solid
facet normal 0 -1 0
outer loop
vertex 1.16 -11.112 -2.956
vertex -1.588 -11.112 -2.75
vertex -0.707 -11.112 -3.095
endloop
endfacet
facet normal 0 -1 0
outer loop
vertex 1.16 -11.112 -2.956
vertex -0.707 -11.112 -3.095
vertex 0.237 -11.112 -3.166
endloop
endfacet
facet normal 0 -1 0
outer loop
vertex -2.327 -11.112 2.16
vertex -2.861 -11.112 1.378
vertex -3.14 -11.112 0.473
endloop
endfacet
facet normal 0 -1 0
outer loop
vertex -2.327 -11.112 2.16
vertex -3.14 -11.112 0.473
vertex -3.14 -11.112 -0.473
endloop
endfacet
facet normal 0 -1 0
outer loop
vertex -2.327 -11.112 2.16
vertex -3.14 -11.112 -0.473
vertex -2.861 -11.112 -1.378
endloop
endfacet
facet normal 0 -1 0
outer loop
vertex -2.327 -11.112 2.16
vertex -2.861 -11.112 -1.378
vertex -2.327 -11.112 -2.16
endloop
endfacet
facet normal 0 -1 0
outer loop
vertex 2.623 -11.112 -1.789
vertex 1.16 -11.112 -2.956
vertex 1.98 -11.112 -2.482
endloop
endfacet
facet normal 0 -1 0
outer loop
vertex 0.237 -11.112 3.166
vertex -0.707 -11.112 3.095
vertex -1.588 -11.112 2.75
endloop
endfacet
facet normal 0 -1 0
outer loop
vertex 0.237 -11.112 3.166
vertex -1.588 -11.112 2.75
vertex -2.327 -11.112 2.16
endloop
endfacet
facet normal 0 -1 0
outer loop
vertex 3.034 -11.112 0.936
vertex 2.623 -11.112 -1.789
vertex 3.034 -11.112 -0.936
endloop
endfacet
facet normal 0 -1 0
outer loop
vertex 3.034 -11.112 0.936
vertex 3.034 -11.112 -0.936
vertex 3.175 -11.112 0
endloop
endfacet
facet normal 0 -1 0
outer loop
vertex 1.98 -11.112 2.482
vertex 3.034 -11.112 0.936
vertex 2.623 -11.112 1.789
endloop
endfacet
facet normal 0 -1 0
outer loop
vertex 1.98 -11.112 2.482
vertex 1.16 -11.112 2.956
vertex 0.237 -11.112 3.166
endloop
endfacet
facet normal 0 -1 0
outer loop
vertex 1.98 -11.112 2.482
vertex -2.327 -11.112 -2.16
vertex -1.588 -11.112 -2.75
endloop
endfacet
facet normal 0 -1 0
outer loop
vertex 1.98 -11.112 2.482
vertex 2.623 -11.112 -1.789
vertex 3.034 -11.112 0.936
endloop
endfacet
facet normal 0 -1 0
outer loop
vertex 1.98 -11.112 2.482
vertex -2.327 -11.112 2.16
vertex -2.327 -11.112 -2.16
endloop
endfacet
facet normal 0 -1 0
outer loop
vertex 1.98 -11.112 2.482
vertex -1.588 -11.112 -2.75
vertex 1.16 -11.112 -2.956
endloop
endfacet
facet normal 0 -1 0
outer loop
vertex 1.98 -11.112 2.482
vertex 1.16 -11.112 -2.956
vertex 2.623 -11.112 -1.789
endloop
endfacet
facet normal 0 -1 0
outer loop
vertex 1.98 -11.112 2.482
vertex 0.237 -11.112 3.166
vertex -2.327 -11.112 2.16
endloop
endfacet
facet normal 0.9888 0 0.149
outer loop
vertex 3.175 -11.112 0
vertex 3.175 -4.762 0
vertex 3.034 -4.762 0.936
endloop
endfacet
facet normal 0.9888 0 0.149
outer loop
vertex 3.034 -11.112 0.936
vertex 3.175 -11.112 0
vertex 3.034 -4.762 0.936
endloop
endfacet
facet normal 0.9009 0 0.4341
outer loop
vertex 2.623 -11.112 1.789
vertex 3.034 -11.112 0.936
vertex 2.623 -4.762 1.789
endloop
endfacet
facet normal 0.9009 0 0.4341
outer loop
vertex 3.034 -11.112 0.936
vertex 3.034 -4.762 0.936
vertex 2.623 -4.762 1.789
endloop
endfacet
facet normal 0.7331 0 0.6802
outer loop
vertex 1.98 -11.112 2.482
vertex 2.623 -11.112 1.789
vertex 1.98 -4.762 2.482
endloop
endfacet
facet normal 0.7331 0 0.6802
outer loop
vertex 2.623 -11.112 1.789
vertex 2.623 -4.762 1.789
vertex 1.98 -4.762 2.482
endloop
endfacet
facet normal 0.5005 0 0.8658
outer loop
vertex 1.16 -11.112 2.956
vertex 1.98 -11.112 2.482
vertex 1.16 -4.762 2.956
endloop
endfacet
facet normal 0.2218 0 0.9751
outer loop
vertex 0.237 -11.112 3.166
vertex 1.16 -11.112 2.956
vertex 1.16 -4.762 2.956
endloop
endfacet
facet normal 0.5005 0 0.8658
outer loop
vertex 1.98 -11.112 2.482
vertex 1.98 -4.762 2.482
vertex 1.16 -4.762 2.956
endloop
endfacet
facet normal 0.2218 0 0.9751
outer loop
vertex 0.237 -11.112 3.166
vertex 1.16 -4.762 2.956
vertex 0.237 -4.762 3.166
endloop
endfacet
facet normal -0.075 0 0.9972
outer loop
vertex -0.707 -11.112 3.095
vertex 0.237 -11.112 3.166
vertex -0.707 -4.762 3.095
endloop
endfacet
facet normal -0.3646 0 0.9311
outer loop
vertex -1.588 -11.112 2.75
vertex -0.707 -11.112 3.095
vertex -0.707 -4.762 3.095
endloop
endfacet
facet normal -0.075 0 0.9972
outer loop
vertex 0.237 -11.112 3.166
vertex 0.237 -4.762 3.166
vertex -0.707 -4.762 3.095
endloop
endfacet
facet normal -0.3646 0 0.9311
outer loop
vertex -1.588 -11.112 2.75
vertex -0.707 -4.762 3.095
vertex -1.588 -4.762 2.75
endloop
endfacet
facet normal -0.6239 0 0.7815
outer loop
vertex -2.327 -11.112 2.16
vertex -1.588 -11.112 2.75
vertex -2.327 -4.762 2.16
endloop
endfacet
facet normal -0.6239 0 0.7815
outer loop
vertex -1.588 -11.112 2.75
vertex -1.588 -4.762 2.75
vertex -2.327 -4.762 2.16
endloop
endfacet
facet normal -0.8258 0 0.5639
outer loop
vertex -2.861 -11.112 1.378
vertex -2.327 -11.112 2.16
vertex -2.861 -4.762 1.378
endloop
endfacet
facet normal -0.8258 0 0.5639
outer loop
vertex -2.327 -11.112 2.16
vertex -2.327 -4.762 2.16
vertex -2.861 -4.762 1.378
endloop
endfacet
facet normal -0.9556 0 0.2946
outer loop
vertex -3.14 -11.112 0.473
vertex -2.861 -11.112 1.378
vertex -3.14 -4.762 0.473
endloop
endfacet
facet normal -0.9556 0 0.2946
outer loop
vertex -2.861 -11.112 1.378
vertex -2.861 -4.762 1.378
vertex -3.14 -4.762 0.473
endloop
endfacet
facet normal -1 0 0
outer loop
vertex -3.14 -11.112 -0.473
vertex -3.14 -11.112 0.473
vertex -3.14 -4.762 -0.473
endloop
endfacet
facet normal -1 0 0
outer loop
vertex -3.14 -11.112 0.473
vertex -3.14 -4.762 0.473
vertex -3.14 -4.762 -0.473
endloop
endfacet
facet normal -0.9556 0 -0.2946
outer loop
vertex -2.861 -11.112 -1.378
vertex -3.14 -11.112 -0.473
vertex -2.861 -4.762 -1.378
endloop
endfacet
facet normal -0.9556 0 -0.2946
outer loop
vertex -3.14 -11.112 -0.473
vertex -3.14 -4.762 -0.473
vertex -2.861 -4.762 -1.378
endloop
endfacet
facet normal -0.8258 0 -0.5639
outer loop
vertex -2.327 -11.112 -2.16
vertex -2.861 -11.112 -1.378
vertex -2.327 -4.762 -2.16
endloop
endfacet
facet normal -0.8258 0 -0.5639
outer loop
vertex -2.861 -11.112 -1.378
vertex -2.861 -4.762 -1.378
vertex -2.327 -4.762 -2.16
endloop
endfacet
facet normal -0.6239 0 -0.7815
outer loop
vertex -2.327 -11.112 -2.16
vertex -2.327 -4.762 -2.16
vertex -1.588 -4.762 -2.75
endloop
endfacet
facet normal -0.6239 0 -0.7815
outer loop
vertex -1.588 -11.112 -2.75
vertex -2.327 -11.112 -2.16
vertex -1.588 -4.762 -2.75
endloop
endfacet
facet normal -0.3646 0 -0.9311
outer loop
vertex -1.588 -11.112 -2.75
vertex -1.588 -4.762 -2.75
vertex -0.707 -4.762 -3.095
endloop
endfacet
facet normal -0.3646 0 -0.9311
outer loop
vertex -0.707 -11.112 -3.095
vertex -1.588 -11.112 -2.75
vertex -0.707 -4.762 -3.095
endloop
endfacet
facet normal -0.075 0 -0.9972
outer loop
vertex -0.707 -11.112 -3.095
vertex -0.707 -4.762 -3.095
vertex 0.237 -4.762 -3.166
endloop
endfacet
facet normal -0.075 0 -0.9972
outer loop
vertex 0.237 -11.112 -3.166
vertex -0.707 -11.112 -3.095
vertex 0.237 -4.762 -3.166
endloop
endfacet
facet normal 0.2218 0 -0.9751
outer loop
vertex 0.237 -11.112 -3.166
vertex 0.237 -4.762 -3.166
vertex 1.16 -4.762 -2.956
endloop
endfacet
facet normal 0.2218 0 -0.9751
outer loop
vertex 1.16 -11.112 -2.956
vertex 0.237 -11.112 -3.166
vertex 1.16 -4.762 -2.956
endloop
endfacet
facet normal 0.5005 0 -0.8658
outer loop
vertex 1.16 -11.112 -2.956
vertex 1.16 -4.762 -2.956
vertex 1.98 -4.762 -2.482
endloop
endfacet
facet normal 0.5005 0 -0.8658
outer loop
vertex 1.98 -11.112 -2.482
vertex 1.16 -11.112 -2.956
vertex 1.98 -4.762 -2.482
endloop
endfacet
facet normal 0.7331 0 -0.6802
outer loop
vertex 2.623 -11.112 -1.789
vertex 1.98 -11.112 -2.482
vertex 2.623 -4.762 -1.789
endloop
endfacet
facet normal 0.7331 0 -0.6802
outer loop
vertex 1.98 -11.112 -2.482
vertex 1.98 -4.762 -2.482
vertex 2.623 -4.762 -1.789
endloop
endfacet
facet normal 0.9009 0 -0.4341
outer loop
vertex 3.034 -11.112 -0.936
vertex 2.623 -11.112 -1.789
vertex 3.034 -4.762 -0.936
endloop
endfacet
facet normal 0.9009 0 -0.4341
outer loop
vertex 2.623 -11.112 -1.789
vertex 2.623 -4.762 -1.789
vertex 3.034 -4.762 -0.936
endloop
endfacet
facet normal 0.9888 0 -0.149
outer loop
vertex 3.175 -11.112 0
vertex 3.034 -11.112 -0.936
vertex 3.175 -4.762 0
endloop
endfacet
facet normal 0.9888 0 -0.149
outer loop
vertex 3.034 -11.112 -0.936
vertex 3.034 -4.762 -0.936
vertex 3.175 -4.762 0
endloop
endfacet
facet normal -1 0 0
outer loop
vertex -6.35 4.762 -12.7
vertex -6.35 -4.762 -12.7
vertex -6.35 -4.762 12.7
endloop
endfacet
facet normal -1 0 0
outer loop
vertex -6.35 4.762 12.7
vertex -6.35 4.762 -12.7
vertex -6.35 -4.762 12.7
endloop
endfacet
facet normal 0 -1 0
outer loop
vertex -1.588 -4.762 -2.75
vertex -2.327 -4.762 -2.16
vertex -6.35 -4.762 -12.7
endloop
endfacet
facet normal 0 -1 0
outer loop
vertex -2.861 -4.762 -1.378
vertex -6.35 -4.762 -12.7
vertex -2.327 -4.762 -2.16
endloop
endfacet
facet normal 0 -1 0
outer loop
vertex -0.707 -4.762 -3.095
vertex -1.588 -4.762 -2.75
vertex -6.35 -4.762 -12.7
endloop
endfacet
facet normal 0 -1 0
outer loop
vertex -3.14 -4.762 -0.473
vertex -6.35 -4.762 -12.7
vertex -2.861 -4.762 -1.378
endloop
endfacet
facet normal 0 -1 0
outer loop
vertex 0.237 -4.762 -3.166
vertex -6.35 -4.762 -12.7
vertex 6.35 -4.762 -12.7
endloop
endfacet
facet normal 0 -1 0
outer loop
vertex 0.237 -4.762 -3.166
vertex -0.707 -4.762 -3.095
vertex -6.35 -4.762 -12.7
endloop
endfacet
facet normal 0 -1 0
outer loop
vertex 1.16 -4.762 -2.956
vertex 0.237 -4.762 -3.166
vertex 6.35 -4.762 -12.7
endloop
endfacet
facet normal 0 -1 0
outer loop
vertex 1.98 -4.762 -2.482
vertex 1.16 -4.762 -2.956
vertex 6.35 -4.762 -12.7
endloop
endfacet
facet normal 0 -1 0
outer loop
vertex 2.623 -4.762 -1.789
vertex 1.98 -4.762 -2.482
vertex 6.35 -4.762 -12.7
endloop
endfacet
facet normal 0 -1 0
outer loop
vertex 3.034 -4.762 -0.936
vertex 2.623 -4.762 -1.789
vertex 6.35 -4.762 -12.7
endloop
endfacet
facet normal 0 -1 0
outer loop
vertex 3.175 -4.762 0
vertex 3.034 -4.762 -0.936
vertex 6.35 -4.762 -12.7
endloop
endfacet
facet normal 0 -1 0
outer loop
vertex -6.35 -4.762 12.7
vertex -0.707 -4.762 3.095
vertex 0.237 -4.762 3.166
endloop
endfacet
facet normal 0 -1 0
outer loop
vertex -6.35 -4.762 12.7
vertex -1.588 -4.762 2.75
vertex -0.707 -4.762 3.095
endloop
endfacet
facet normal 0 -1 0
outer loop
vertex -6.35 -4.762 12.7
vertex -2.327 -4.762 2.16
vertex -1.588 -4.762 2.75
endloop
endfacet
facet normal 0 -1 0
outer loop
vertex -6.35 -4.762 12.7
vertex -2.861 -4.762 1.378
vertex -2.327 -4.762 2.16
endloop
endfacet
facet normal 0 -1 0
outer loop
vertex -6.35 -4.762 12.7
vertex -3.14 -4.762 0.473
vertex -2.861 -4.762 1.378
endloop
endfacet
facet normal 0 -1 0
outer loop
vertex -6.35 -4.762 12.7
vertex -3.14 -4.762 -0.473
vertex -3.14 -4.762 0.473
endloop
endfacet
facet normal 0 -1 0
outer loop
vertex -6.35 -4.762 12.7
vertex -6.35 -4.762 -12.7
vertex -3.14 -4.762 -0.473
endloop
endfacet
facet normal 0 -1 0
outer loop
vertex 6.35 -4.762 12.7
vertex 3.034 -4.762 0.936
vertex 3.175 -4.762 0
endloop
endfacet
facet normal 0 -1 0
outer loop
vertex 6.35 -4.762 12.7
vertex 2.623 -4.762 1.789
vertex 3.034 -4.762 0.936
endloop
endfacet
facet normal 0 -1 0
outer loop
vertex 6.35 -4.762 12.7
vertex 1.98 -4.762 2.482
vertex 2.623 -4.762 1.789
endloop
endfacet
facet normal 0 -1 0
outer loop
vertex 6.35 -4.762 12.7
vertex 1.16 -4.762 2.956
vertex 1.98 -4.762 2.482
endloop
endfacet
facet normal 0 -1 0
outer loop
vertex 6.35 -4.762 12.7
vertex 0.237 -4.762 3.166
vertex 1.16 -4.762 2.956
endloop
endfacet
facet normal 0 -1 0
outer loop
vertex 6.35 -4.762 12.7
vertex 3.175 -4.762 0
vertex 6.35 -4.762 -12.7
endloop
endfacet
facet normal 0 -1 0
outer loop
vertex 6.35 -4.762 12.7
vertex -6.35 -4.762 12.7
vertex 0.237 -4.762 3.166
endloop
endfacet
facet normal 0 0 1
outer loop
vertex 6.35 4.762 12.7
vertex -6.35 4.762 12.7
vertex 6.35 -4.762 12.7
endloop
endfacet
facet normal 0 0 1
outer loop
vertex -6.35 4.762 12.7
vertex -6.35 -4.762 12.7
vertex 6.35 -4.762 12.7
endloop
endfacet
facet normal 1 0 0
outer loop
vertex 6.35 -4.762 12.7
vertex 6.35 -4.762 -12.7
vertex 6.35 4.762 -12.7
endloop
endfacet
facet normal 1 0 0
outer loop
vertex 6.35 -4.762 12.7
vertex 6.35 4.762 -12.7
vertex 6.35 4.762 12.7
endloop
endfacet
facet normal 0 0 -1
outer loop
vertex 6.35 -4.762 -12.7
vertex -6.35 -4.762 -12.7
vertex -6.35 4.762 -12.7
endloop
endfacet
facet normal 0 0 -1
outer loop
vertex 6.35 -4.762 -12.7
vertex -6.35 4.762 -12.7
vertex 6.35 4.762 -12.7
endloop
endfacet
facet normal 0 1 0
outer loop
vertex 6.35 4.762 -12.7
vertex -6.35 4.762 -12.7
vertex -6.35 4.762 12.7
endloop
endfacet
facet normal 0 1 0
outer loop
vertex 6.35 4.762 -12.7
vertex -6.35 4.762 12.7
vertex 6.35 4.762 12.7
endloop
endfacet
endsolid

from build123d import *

# Parameters (mm, degrees)
F0_W     = 12.7
F0_H     = 25.4
F1_DEPTH = 4.7625
F2_R     = 3.175
F3_DEPTH = 6.35


with BuildPart() as f1:
    # F0 (on Front) → F1 (new body, symmetric)
    with BuildSketch(Plane.XZ):
        Rectangle(F0_W, F0_H)
    extrude(amount=F1_DEPTH, both=True)

    # F2 (on face) → F3 (join)
    with BuildSketch(Plane.XZ.offset(4.7625)):
        Circle(F2_R)
    extrude(amount=F3_DEPTH)


solid = f1.part
